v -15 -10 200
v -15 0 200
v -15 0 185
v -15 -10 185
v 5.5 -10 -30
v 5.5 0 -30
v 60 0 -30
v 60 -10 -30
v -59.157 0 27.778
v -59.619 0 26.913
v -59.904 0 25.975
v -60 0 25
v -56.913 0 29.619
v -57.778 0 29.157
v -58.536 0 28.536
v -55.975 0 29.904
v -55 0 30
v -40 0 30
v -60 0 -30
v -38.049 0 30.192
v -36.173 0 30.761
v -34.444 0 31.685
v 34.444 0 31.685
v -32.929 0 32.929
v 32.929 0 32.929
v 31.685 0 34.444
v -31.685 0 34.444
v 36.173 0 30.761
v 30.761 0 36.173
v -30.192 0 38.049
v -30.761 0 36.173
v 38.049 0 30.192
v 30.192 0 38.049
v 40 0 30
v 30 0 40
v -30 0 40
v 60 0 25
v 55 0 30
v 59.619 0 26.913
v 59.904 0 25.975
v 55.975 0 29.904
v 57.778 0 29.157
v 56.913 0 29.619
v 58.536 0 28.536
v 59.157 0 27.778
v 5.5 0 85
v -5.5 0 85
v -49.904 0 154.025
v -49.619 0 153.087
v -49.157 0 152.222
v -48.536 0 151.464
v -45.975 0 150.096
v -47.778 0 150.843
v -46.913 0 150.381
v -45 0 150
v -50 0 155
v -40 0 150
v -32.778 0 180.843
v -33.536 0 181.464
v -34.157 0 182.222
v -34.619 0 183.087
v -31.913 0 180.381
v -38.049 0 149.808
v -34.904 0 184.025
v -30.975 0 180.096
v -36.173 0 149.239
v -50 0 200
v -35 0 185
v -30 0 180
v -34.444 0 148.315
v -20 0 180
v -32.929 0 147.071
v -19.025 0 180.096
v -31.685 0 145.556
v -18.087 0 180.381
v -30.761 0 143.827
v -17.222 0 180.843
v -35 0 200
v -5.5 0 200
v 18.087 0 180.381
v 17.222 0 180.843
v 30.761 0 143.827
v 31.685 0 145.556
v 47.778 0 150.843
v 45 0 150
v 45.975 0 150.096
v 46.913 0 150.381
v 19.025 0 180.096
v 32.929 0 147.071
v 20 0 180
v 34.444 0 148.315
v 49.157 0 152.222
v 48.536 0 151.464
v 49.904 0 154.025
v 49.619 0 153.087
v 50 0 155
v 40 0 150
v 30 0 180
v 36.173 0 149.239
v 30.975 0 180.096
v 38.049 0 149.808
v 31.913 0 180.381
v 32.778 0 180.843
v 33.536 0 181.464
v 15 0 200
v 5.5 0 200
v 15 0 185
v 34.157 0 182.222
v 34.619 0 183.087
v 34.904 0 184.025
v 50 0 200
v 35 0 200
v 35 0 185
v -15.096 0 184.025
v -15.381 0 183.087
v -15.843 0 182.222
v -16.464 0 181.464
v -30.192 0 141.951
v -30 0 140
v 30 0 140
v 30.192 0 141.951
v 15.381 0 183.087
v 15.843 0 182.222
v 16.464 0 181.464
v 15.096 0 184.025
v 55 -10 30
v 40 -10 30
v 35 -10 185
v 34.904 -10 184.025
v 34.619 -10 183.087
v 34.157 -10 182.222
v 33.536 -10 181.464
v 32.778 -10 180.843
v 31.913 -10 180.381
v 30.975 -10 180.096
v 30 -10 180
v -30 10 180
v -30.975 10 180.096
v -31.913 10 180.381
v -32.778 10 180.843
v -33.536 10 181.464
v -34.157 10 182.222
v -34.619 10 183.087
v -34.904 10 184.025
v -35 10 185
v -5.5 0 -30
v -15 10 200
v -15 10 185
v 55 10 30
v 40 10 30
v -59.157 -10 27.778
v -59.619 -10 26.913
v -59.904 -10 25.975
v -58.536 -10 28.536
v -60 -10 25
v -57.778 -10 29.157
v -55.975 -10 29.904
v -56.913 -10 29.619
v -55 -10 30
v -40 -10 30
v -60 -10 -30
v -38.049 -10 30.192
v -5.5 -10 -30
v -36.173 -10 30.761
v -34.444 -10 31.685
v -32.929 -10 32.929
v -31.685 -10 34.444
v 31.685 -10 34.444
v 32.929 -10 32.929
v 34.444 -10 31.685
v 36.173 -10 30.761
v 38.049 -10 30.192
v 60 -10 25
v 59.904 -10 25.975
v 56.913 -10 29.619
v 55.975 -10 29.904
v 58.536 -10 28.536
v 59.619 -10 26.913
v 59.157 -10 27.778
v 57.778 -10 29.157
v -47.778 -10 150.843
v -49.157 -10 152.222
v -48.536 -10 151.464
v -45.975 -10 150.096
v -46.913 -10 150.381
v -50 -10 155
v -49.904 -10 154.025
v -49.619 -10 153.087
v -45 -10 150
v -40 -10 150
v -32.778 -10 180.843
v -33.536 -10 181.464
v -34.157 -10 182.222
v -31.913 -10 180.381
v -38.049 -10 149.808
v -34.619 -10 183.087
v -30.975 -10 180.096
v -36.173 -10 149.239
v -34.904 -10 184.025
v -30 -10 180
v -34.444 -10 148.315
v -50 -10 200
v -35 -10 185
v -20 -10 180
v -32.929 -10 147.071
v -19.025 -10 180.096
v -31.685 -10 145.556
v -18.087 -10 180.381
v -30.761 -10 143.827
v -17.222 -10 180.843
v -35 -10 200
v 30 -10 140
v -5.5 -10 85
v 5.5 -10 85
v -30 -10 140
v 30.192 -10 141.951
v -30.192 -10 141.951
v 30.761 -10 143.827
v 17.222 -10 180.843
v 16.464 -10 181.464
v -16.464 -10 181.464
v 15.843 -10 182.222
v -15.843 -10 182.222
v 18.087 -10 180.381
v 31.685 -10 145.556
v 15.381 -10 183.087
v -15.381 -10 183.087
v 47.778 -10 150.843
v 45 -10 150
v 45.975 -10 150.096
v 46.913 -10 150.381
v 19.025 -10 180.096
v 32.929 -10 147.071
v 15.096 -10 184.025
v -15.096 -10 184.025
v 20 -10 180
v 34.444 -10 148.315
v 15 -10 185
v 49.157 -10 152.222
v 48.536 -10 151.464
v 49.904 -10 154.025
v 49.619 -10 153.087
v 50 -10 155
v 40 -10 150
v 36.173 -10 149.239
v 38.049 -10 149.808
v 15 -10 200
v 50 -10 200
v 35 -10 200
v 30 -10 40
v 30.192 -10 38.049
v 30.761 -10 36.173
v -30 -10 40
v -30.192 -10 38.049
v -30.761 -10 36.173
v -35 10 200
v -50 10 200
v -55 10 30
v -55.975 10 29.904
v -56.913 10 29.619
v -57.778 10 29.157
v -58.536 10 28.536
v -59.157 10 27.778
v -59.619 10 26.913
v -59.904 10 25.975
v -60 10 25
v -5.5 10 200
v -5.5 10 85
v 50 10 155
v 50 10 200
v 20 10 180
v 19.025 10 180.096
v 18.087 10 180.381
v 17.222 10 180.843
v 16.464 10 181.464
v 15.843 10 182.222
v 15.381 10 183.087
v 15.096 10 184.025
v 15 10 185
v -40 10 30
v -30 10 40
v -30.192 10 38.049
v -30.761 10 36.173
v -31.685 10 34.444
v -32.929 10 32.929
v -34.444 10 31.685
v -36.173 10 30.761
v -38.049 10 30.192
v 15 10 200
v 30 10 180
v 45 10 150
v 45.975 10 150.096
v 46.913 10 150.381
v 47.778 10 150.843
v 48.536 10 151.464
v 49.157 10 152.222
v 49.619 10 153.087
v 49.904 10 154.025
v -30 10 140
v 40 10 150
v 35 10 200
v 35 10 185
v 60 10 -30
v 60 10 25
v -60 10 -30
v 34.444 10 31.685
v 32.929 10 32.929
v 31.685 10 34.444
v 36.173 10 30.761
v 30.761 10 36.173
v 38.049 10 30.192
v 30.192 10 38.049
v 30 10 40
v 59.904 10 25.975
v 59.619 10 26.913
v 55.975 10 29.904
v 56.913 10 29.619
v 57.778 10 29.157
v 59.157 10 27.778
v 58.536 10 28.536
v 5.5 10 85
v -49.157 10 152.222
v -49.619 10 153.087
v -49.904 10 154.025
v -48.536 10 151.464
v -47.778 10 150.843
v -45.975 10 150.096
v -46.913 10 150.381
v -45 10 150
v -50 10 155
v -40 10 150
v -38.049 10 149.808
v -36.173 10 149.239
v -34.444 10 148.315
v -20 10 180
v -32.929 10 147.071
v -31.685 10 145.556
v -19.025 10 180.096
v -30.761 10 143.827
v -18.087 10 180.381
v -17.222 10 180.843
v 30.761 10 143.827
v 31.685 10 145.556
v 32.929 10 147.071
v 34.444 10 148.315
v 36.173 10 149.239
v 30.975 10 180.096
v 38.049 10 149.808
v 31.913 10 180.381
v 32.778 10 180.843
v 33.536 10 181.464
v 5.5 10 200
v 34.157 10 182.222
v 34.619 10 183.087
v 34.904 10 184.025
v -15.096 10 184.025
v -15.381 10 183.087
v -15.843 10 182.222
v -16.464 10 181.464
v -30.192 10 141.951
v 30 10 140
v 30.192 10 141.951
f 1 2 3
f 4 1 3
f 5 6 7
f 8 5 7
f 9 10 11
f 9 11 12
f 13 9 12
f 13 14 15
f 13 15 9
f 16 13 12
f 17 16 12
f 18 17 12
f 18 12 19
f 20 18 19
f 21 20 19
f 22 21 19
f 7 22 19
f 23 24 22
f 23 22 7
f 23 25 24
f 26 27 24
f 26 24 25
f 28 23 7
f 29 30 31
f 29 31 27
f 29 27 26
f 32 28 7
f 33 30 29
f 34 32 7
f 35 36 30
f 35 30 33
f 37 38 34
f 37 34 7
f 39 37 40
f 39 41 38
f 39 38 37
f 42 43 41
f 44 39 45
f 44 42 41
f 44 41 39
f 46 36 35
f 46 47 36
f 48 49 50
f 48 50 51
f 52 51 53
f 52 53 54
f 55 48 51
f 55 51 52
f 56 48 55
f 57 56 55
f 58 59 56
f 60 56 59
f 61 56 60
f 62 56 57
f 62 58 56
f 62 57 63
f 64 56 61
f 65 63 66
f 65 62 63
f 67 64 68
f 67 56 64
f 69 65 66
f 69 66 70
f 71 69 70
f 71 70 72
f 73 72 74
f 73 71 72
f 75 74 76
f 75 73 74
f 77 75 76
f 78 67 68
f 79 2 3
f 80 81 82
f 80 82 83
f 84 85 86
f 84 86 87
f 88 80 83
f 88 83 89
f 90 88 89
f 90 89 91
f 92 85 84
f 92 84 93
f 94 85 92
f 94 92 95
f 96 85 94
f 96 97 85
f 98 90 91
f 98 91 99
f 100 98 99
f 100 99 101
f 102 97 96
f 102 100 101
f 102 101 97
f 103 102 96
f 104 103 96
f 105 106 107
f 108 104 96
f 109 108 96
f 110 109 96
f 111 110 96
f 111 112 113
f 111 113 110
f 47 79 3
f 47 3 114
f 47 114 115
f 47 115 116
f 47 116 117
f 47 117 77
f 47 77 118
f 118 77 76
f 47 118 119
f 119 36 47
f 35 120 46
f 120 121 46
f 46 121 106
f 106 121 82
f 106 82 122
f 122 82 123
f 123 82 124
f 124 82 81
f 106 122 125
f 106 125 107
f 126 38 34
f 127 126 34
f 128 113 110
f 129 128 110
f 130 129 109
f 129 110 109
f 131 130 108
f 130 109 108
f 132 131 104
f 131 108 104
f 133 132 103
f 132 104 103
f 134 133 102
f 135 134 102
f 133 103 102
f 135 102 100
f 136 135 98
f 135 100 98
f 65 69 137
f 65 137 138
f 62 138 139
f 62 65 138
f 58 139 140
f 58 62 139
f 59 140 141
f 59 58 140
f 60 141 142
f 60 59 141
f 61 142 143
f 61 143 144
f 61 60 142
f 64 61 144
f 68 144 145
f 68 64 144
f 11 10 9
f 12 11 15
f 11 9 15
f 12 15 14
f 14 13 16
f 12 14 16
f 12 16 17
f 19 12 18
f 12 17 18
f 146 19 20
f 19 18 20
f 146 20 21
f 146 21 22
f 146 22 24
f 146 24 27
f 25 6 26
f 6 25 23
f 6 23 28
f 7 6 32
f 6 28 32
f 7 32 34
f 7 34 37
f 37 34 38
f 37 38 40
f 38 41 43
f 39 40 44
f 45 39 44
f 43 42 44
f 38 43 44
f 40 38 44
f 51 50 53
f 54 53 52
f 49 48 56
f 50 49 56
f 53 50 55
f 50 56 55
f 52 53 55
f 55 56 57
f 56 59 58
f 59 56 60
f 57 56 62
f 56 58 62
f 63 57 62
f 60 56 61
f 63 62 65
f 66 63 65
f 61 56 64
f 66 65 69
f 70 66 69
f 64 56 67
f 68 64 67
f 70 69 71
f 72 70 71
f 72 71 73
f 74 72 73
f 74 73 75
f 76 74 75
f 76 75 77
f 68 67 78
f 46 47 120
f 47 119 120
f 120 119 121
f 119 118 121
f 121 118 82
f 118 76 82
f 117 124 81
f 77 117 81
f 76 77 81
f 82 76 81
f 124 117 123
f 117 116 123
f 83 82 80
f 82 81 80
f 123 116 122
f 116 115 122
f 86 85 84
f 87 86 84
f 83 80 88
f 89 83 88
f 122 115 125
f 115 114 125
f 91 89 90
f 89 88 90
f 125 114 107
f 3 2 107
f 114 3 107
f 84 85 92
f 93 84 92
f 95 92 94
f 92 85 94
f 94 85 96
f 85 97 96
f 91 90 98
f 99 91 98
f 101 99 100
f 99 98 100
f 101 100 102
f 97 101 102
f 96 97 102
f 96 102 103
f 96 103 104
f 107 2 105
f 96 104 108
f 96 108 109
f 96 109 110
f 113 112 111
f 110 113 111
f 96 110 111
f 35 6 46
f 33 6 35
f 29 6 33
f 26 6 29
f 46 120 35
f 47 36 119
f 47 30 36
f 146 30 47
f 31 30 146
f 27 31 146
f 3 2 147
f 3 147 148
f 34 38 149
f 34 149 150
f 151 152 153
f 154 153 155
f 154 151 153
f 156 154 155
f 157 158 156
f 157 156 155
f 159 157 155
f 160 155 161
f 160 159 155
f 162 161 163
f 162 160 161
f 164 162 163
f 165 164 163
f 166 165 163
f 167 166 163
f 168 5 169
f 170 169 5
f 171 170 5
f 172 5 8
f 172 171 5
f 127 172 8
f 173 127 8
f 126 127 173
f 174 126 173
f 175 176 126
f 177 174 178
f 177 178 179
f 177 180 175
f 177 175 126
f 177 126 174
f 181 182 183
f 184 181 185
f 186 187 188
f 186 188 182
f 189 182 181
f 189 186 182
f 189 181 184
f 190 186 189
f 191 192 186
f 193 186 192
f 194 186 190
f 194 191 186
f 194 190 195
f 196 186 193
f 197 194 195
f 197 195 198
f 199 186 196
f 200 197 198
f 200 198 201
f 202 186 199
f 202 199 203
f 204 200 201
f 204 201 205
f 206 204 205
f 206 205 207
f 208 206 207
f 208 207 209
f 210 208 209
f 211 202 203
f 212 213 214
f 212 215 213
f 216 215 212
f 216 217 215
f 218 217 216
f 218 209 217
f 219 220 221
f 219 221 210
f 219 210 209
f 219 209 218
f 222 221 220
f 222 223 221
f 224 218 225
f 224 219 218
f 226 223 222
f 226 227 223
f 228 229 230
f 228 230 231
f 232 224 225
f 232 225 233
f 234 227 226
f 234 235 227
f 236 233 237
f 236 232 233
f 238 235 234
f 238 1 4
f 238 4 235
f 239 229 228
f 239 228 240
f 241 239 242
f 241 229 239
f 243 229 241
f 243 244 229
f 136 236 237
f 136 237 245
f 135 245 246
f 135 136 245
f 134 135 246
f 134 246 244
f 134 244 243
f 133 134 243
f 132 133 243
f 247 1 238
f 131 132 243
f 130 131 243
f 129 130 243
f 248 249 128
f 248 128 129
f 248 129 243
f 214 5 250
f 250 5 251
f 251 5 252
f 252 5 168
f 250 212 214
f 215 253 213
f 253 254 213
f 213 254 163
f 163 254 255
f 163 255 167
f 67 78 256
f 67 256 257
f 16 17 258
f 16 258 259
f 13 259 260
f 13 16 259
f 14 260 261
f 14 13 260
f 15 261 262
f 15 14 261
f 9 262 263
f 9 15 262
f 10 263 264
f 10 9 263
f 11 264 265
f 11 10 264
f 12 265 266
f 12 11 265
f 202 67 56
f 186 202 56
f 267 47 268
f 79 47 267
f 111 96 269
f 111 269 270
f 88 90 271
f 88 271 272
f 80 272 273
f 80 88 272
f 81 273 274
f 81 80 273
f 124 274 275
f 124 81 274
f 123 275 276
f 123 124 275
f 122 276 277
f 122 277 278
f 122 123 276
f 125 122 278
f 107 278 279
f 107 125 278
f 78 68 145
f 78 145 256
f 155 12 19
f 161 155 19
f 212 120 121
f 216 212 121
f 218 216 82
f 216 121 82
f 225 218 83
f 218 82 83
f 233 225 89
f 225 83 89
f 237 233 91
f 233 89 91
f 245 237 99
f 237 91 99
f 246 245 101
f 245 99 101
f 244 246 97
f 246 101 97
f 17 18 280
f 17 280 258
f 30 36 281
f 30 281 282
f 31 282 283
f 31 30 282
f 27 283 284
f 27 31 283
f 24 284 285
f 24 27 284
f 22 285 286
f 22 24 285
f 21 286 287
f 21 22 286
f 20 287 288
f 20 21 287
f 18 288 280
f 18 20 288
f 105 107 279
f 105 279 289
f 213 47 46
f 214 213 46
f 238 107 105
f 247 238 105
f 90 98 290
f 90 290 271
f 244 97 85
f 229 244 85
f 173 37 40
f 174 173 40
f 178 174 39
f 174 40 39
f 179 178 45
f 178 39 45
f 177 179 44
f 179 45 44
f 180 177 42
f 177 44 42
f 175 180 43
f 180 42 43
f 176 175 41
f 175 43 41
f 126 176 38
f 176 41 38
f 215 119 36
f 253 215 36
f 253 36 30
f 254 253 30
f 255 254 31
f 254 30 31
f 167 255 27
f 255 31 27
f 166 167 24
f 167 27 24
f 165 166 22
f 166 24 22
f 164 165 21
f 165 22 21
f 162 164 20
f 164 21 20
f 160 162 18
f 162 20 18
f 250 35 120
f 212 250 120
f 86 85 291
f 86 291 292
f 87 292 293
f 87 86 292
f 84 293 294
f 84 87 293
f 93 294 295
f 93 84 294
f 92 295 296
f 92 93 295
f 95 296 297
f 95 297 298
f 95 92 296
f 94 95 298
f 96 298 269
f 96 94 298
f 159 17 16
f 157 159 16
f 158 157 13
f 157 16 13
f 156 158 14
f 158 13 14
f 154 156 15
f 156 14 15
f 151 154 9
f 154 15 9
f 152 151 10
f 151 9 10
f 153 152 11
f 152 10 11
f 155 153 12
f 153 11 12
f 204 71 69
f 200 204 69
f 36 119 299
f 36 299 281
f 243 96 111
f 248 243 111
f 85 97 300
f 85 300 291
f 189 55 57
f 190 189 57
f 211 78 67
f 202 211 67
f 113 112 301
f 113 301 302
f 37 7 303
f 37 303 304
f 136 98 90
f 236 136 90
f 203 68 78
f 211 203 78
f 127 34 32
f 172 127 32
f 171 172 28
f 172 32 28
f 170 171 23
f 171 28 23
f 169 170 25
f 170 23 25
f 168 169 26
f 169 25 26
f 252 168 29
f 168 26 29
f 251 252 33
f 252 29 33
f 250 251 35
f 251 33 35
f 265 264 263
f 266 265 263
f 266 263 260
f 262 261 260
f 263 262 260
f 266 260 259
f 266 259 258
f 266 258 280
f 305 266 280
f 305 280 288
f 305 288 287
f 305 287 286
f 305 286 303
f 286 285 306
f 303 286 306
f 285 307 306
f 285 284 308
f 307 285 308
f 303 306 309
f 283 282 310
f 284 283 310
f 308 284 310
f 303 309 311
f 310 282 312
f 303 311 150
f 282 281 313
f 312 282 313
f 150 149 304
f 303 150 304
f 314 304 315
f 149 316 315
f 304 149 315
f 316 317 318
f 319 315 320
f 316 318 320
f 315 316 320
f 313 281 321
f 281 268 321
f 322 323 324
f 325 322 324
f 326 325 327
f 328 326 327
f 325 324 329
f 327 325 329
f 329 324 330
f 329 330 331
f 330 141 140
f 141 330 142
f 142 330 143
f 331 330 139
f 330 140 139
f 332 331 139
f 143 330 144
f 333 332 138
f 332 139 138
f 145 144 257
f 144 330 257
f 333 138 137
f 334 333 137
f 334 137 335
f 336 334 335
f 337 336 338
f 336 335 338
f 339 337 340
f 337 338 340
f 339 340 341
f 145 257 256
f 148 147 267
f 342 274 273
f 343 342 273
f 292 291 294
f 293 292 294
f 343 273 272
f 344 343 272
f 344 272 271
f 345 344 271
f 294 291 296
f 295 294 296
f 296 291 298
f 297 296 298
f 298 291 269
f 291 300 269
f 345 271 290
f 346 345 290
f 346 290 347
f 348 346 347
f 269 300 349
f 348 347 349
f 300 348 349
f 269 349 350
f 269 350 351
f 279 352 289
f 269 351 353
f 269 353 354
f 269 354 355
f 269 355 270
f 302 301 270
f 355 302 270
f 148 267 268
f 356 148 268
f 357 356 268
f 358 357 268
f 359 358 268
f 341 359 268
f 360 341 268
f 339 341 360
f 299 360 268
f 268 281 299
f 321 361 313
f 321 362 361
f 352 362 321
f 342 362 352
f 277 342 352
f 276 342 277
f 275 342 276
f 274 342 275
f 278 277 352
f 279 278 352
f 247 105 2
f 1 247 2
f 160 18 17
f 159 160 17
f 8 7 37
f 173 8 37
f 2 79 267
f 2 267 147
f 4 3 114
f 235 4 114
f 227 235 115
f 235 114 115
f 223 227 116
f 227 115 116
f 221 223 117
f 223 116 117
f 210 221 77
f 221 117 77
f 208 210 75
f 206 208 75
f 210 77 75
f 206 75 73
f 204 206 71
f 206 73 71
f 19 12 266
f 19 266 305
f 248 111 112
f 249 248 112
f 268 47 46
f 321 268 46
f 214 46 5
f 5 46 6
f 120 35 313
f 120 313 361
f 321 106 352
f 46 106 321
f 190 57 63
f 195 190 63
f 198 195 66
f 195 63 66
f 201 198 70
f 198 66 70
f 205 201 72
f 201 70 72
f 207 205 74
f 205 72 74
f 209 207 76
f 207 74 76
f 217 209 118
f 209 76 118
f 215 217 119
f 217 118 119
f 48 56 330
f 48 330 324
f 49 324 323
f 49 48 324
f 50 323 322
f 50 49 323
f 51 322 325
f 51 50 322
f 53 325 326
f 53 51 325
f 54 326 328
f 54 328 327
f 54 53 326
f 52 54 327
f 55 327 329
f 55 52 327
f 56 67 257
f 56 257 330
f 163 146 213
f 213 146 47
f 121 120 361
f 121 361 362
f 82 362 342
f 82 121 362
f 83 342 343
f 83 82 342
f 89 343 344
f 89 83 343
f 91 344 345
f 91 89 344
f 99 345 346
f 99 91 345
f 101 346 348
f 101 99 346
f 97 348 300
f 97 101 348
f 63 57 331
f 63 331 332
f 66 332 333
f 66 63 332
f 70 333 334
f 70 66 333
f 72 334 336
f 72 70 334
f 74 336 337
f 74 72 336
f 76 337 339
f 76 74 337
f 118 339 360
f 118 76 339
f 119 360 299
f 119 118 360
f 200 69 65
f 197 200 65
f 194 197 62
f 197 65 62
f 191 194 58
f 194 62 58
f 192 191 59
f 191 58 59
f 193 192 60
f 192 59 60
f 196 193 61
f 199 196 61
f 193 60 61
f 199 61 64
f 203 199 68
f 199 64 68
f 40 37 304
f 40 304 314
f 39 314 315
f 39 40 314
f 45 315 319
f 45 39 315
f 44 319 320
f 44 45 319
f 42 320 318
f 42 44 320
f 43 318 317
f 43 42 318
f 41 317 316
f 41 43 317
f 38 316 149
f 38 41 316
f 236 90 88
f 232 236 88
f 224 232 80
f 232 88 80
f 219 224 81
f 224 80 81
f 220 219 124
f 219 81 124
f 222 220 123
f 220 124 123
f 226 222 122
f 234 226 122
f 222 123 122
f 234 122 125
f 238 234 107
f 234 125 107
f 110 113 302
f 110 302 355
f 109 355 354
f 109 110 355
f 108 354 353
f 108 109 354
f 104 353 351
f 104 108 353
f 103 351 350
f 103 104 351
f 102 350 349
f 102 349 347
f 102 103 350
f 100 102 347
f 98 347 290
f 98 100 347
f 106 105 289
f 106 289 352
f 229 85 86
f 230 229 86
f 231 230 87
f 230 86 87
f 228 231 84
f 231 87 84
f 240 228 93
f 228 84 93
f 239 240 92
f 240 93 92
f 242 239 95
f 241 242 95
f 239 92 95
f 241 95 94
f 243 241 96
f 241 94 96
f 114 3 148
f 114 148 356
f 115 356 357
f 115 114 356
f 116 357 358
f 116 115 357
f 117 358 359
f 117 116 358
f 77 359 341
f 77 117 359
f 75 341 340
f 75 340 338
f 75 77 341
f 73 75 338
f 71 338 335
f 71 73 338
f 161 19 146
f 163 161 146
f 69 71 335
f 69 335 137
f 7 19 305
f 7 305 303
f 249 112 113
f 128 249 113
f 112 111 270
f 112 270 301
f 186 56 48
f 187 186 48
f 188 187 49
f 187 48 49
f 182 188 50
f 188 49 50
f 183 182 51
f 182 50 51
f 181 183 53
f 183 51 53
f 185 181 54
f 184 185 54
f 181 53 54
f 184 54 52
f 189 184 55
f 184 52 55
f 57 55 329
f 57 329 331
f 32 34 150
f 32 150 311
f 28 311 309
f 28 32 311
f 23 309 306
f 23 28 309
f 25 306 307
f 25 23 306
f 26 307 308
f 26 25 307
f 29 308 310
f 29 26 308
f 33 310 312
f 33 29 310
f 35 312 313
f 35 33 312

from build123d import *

# Parameters (mm, degrees)
F0_W     = 11
F0_H     = 65
F0_H_2   = 50
F1_DEPTH = 10
F0_H_3   = 60
F0_H_4   = 55
F2_DEPTH = 10


with BuildPart() as f1:
    # F0 (on Front) → F1 (new body)
    with BuildSketch(Plane.XZ):
        with Locations((0, 117.5)):
            Rectangle(F0_W, F0_H)
        with BuildLine():
            ThreePointArc((-30, 40), (-32.928932, 32.928932), (-40, 30))
            Line((-40, 30), (-55, 30))
            ThreePointArc((-55, 30), (-58.535534, 28.535534), (-60, 25))
            Line((-60, 25), (-60, -30))
            Line((-60, -30), (-5.5, -30))
            Line((-5.5, -30), (-5.5, 30))
            Line((-5.5, 30), (-5.5, 85))
            Line((-5.5, 85), (-5.5, 150))
            Line((-5.5, 150), (-5.5, 200))
            Line((-5.5, 200), (-15, 200))
            Line((-15, 200), (-15, 185))
            ThreePointArc((-15, 185), (-16.464466, 181.464466), (-20, 180))
            Line((-20, 180), (-30, 180))
            ThreePointArc((-30, 180), (-33.535534, 181.464466), (-35, 185))
            Line((-35, 185), (-35, 200))
            Line((-35, 200), (-50, 200))
            Line((-50, 200), (-50, 155))
            ThreePointArc((-50, 155), (-48.535534, 151.464466), (-45, 150))
            Line((-45, 150), (-40, 150))
            ThreePointArc((-40, 150), (-32.928932, 147.071068), (-30, 140))
            Line((-30, 140), (-30, 40))
        make_face()
        with Locations((0, 175)):
            Rectangle(F0_W, F0_H_2)
        with BuildLine():
            Line((5.5, 30), (5.5, -30))
            Line((5.5, -30), (60, -30))
            Line((60, -30), (60, 25))
            ThreePointArc((60, 25), (58.535534, 28.535534), (55, 30))
            Line((55, 30), (40, 30))
            ThreePointArc((40, 30), (32.928932, 32.928932), (30, 40))
            Line((30, 40), (30, 140))
            ThreePointArc((30, 140), (32.928932, 147.071068), (40, 150))
            Line((40, 150), (45, 150))
            ThreePointArc((45, 150), (48.535534, 151.464466), (50, 155))
            Line((50, 155), (50, 200))
            Line((50, 200), (35, 200))
            Line((35, 200), (35, 185))
            ThreePointArc((35, 185), (33.535534, 181.464466), (30, 180))
            Line((30, 180), (20, 180))
            ThreePointArc((20, 180), (16.464466, 181.464466), (15, 185))
            Line((15, 185), (15, 200))
            Line((15, 200), (5.5, 200))
            Line((5.5, 200), (5.5, 150))
            Line((5.5, 150), (5.5, 85))
            Line((5.5, 85), (5.5, 30))
        make_face()
    extrude(amount=F1_DEPTH)


with BuildPart() as f2:
    # F0 (on Front) → F2 (new body)
    with BuildSketch(Plane.XZ):
        Rectangle(F0_W, F0_H_3)
        with BuildLine():
            ThreePointArc((-30, 40), (-32.928932, 32.928932), (-40, 30))
            Line((-40, 30), (-55, 30))
            ThreePointArc((-55, 30), (-58.535534, 28.535534), (-60, 25))
            Line((-60, 25), (-60, -30))
            Line((-60, -30), (-5.5, -30))
            Line((-5.5, -30), (-5.5, 30))
            Line((-5.5, 30), (-5.5, 85))
            Line((-5.5, 85), (-5.5, 150))
            Line((-5.5, 150), (-5.5, 200))
            Line((-5.5, 200), (-15, 200))
            Line((-15, 200), (-15, 185))
            ThreePointArc((-15, 185), (-16.464466, 181.464466), (-20, 180))
            Line((-20, 180), (-30, 180))
            ThreePointArc((-30, 180), (-33.535534, 181.464466), (-35, 185))
            Line((-35, 185), (-35, 200))
            Line((-35, 200), (-50, 200))
            Line((-50, 200), (-50, 155))
            ThreePointArc((-50, 155), (-48.535534, 151.464466), (-45, 150))
            Line((-45, 150), (-40, 150))
            ThreePointArc((-40, 150), (-32.928932, 147.071068), (-30, 140))
            Line((-30, 140), (-30, 40))
        make_face()
        with BuildLine():
            Line((5.5, 30), (5.5, -30))
            Line((5.5, -30), (60, -30))
            Line((60, -30), (60, 25))
            ThreePointArc((60, 25), (58.535534, 28.535534), (55, 30))
            Line((55, 30), (40, 30))
            ThreePointArc((40, 30), (32.928932, 32.928932), (30, 40))
            Line((30, 40), (30, 140))
            ThreePointArc((30, 140), (32.928932, 147.071068), (40, 150))
            Line((40, 150), (45, 150))
            ThreePointArc((45, 150), (48.535534, 151.464466), (50, 155))
            Line((50, 155), (50, 200))
            Line((50, 200), (35, 200))
            Line((35, 200), (35, 185))
            ThreePointArc((35, 185), (33.535534, 181.464466), (30, 180))
            Line((30, 180), (20, 180))
            ThreePointArc((20, 180), (16.464466, 181.464466), (15, 185))
            Line((15, 185), (15, 200))
            Line((15, 200), (5.5, 200))
            Line((5.5, 200), (5.5, 150))
            Line((5.5, 150), (5.5, 85))
            Line((5.5, 85), (5.5, 30))
        make_face()
        with Locations((0, 57.5)):
            Rectangle(F0_W, F0_H_4)
    extrude(amount=-F2_DEPTH)


solid = Compound([f1.part, f2.part])
